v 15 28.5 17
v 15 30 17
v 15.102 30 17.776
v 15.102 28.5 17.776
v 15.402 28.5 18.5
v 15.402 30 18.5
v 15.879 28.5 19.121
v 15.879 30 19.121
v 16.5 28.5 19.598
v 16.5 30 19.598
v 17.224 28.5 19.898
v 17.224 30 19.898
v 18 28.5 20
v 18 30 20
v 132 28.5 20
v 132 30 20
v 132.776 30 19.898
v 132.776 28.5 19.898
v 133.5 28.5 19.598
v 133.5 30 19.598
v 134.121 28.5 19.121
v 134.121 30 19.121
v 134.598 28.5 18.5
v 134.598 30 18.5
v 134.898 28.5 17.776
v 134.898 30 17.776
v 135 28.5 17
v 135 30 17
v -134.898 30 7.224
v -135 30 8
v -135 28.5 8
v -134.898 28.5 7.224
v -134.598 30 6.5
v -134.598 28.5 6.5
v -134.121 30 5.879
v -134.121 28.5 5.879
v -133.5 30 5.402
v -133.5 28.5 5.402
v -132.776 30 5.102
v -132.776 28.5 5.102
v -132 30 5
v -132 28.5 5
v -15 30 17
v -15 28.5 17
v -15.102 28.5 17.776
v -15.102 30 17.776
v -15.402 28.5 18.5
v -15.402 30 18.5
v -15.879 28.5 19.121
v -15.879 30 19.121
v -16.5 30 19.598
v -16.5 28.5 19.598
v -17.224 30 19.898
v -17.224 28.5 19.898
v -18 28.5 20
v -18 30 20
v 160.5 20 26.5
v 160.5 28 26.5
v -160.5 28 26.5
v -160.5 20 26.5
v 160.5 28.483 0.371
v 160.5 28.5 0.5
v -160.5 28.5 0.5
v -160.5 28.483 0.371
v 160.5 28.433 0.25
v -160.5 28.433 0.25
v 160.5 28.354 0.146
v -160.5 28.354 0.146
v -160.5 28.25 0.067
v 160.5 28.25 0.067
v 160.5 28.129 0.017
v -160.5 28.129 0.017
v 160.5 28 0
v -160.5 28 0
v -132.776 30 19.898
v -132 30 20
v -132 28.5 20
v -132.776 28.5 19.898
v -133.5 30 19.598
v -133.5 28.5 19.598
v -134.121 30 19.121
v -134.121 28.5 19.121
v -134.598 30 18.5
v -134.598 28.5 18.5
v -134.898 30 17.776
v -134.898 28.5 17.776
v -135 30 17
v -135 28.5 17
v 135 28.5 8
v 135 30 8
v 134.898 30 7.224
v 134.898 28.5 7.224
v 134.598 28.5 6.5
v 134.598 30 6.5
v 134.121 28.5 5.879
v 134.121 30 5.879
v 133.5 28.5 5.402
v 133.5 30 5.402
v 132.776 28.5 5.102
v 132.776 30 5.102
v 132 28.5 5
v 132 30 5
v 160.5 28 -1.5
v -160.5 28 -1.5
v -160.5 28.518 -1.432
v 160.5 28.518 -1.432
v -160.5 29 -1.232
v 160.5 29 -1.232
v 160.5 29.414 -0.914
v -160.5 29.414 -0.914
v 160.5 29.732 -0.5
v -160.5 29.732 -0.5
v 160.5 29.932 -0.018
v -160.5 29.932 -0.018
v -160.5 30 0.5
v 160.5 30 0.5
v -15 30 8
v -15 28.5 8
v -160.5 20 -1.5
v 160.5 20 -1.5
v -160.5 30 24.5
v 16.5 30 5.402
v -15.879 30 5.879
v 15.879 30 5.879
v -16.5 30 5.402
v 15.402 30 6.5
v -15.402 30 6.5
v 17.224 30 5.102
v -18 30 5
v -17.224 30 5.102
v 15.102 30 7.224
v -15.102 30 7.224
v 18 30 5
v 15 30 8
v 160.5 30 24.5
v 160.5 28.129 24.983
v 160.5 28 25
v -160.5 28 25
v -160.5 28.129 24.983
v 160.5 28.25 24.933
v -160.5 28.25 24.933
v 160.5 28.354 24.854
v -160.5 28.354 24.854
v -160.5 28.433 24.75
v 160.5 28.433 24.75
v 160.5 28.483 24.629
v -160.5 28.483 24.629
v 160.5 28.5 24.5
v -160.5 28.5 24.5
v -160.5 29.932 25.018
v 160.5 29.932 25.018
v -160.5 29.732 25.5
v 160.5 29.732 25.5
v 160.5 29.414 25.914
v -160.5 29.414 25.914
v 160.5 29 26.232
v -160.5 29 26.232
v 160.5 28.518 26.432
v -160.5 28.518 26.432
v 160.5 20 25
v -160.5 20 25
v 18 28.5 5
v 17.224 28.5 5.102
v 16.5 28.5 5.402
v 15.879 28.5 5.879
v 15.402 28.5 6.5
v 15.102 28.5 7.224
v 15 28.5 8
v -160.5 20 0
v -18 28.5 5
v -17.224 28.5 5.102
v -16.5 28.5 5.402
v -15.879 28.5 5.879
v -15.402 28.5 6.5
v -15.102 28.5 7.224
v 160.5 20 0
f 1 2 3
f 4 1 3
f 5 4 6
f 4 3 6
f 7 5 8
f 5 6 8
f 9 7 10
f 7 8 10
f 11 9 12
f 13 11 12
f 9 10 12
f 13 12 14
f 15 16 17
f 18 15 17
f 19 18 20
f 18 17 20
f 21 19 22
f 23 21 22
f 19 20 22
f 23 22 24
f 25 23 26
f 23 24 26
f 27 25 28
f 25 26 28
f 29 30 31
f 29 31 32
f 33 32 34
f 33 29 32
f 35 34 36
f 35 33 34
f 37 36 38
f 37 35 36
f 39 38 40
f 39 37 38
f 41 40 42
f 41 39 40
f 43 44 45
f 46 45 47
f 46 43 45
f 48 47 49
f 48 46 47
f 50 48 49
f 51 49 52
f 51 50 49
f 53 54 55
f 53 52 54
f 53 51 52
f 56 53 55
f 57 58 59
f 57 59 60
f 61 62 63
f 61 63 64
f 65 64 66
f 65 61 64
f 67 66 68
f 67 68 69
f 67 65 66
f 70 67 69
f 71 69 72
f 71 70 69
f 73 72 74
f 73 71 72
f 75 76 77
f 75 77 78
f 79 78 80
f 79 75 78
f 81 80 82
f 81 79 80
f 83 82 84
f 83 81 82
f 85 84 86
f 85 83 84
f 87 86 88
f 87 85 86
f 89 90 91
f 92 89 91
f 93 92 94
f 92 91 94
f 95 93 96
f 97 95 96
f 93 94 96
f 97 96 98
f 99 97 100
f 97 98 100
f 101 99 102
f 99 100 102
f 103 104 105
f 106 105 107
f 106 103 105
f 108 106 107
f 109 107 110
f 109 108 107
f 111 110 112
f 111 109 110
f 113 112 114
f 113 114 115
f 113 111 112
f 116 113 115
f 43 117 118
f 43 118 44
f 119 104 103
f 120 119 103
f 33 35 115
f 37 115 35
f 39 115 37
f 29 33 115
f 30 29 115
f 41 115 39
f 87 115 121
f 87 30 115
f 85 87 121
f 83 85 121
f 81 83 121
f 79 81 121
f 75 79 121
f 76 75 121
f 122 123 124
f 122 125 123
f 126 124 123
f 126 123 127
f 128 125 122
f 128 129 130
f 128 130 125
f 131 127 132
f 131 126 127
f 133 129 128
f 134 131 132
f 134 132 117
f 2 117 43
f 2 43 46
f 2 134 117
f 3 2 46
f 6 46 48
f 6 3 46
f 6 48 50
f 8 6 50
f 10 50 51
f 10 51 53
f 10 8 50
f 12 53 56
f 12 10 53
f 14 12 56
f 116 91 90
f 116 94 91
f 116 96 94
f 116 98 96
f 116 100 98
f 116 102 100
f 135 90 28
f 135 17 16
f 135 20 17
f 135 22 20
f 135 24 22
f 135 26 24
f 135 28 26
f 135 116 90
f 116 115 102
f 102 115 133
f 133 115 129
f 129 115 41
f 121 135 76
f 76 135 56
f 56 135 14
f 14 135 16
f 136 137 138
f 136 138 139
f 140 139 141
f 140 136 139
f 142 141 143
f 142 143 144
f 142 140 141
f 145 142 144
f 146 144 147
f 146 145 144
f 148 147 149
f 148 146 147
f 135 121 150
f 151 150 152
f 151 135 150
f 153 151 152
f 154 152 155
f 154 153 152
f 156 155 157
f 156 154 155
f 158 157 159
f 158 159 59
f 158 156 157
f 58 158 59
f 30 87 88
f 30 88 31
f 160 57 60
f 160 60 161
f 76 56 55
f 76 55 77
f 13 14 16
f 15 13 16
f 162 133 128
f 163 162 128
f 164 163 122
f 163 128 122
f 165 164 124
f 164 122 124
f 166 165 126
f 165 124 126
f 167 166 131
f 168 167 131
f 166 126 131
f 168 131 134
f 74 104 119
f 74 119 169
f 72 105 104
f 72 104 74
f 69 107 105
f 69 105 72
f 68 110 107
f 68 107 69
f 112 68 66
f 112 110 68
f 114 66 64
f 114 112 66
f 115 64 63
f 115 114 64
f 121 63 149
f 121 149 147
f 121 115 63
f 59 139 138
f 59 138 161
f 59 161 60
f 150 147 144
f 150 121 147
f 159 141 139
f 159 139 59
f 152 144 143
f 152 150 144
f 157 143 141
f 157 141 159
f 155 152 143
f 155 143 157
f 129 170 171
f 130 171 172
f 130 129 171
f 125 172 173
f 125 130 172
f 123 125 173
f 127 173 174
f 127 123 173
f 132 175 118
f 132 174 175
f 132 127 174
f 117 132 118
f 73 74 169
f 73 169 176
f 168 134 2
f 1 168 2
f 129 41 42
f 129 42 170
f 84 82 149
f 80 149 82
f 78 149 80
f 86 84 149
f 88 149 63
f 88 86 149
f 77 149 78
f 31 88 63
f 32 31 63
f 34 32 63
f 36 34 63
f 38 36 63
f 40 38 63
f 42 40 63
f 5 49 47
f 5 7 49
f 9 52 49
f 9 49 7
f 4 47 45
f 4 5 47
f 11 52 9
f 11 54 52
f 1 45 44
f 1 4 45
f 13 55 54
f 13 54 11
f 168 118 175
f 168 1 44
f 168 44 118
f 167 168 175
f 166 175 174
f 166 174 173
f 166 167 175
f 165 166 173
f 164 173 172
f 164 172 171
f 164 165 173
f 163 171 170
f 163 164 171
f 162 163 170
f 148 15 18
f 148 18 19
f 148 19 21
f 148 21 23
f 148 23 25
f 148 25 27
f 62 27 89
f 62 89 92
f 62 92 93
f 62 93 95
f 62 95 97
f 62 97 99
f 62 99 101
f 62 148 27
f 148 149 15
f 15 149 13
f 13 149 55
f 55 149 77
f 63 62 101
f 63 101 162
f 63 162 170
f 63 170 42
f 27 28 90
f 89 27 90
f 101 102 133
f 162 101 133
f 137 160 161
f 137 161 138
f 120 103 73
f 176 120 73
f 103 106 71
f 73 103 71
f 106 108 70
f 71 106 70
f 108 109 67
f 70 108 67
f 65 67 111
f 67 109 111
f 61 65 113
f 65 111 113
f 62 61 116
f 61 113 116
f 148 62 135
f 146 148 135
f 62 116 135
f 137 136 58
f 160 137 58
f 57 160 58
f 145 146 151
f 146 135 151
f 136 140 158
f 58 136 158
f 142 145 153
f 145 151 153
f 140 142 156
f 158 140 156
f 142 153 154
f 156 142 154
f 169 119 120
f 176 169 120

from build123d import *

# Parameters (mm, degrees)
SKETCH_1_W                         = 321
SKETCH_1_H                         = 60
SM_BASE_FLANGE_1_DEPTH             = 1.5
SM_EDGE_FLANGE_1_STRIP_W           = 7
SM_EDGE_FLANGE_1_STRIP_H           = 1.5
SM_EDGE_FLANGE_1_STRIP_CUT_DEPTH   = 321
SM_EDGE_FLANGE_1_STRIP_2_W         = 7
SM_EDGE_FLANGE_1_STRIP_2_H         = 1.5
SM_EDGE_FLANGE_1_STRIP_CUT_2_DEPTH = 321
SM_EDGE_FLANGE_1_DEPTH             = 321
SM_EDGE_FLANGE_1_BEND_DEPTH        = 321
SM_EDGE_FLANGE_2_STRIP_W           = 7
SM_EDGE_FLANGE_2_STRIP_H           = 1.5
SM_EDGE_FLANGE_2_STRIP_CUT_DEPTH   = 321
SM_EDGE_FLANGE_2_STRIP_2_W         = 7
SM_EDGE_FLANGE_2_STRIP_2_H         = 1.5
SM_EDGE_FLANGE_2_STRIP_CUT_2_DEPTH = 321
SM_EDGE_FLANGE_2_DEPTH             = 321
SM_EDGE_FLANGE_2_BEND_DEPTH        = 321
CUT_EXTRUDE_2_DEPTH                = 174.385408844
CUT_EXTRUDE_3_DEPTH                = 57
CUT_EXTRUDE_3_DEPTH_BACK           = 10
SKETCH_20_W                        = 341.087454661
SKETCH_20_H                        = 74.910603127


# Sheet-metal steps are written as plain solids
with BuildPart() as part:
    # Sketch 1 → 基体-法兰1 (new body)
    with BuildSketch(Plane.XY):
        Rectangle(SKETCH_1_W, SKETCH_1_H)
    extrude(amount=-SM_BASE_FLANGE_1_DEPTH)

    # 边线-法兰1 strip (across the edge) → 边线-法兰1 strip cut (cut)
    with BuildSketch(Plane(origin=(160.5, 30, 0), x_dir=(0, -1, 0), z_dir=(-1, 0, 0))):
        with Locations((-1.5, -0.75)):
            Rectangle(SM_EDGE_FLANGE_1_STRIP_W, SM_EDGE_FLANGE_1_STRIP_H)
    extrude(amount=SM_EDGE_FLANGE_1_STRIP_CUT_DEPTH, mode=Mode.SUBTRACT)

    # 边线-法兰1 strip 2 (across the edge) → 边线-法兰1 strip cut 2 (cut)
    with BuildSketch(Plane(origin=(-160.5, -30, 0), x_dir=(0, 1, 0), z_dir=(1, 0, 0))):
        with Locations((-1.5, -0.75)):
            Rectangle(SM_EDGE_FLANGE_1_STRIP_2_W, SM_EDGE_FLANGE_1_STRIP_2_H)
    extrude(amount=SM_EDGE_FLANGE_1_STRIP_CUT_2_DEPTH, mode=Mode.SUBTRACT)

    # 边线-法兰1 section (across the edge) → 边线-法兰1 (add)
    with BuildSketch(Plane(origin=(160.5, 30, 0), x_dir=(0, -1, 0), z_dir=(-1, 0, 0))):
        with BuildLine():
            Line((0, 0.5), (0, 26.5))
            Line((0, 26.5), (1.5, 26.5))
            Line((1.5, 26.5), (1.5, 0.5))
            ThreePointArc((1.5, 0.5), (1.646446609, 0.146446609), (2, 0))
            Line((2, 0), (2, -1.5))
            ThreePointArc((2, -1.5), (0.585786438, -0.914213562), (0, 0.5))
        make_face()
    extrude(amount=SM_EDGE_FLANGE_1_DEPTH)

    # 边线-法兰1 section 2 (across the edge) → 边线-法兰1 bend (add)
    with BuildSketch(Plane(origin=(-160.5, -30, 0), x_dir=(0, 1, 0), z_dir=(1, 0, 0))):
        with BuildLine():
            Line((0, 0.5), (0, 26.5))
            Line((0, 26.5), (1.5, 26.5))
            Line((1.5, 26.5), (1.5, 0.5))
            ThreePointArc((1.5, 0.5), (1.646446609, 0.146446609), (2, 0))
            Line((2, 0), (2, -1.5))
            ThreePointArc((2, -1.5), (0.585786438, -0.914213562), (0, 0.5))
        make_face()
    extrude(amount=SM_EDGE_FLANGE_1_BEND_DEPTH)

    # 边线-法兰2 strip (across the edge) → 边线-法兰2 strip cut (cut)
    with BuildSketch(Plane(origin=(160.5, 28.5, 26.5), x_dir=(0, 0, -1), z_dir=(-1, 0, 0))):
        with Locations((-1.5, -0.75)):
            Rectangle(SM_EDGE_FLANGE_2_STRIP_W, SM_EDGE_FLANGE_2_STRIP_H)
    extrude(amount=SM_EDGE_FLANGE_2_STRIP_CUT_DEPTH, mode=Mode.SUBTRACT)

    # 边线-法兰2 strip 2 (across the edge) → 边线-法兰2 strip cut 2 (cut)
    with BuildSketch(Plane(origin=(-160.5, -28.5, 26.5), x_dir=(0, 0, -1), z_dir=(1, 0, 0))):
        with Locations((-1.5, -0.75)):
            Rectangle(SM_EDGE_FLANGE_2_STRIP_2_W, SM_EDGE_FLANGE_2_STRIP_2_H)
    extrude(amount=SM_EDGE_FLANGE_2_STRIP_CUT_2_DEPTH, mode=Mode.SUBTRACT)

    # 边线-法兰2 section (across the edge) → 边线-法兰2 (add)
    with BuildSketch(Plane(origin=(160.5, 28.5, 26.5), x_dir=(0, 0, -1), z_dir=(-1, 0, 0))):
        with BuildLine():
            Line((0, 0.5), (0, 8.5))
            Line((0, 8.5), (1.5, 8.5))
            Line((1.5, 8.5), (1.5, 0.5))
            ThreePointArc((1.5, 0.5), (1.646446609, 0.146446609), (2, 0))
            Line((2, 0), (2, -1.5))
            ThreePointArc((2, -1.5), (0.585786438, -0.914213562), (0, 0.5))
        make_face()
    extrude(amount=SM_EDGE_FLANGE_2_DEPTH)

    # 边线-法兰2 section 2 (across the edge) → 边线-法兰2 bend (add)
    with BuildSketch(Plane(origin=(-160.5, -28.5, 26.5), x_dir=(0, 0, -1), z_dir=(1, 0, 0))):
        with BuildLine():
            Line((0, 0.5), (0, 8.5))
            Line((0, 8.5), (1.5, 8.5))
            Line((1.5, 8.5), (1.5, 0.5))
            ThreePointArc((1.5, 0.5), (1.646446609, 0.146446609), (2, 0))
            Line((2, 0), (2, -1.5))
            ThreePointArc((2, -1.5), (0.585786438, -0.914213562), (0, 0.5))
        make_face()
    extrude(amount=SM_EDGE_FLANGE_2_BEND_DEPTH)

    # 草图19 → 切除-拉伸2 (cut, through all)
    with BuildSketch(Plane(origin=(0, 30, 0), x_dir=(1, 0, 0), z_dir=(0, 1, 0))):
        with BuildLine():
            Line((-132, -5), (-18, -5))
            ThreePointArc((-18, -5), (-15.878679656, -5.878679656), (-15, -8))
            Line((-15, -8), (-15, -17))
            ThreePointArc((-15, -17), (-15.878679656, -19.121320344), (-18, -20))
            Line((-18, -20), (-132, -20))
            ThreePointArc((-132, -20), (-134.121320344, -19.121320344), (-135, -17))
            Line((-135, -17), (-135, -8))
            ThreePointArc((-135, -8), (-134.121320344, -5.878679656), (-132, -5))
        make_face()
    cut_extrude_2 = extrude(amount=-CUT_EXTRUDE_2_DEPTH, mode=Mode.SUBTRACT)

    # 镜向1: 切除-拉伸2 across plane
    add(cut_extrude_2.mirror(Plane(origin=(0, 0, 0), x_dir=(0, 0, 1), z_dir=(1, 0, 0))), mode=Mode.SUBTRACT)

    # 草图20 → 切除-拉伸3 (cut, two sides: drawn at the far end of the back side and taken through both)
    with BuildSketch(Plane.XY.offset(-CUT_EXTRUDE_3_DEPTH_BACK)):
        with Locations((-10.043727331, -17.455301564)):
            Rectangle(SKETCH_20_W, SKETCH_20_H)
    extrude(amount=CUT_EXTRUDE_3_DEPTH + CUT_EXTRUDE_3_DEPTH_BACK, mode=Mode.SUBTRACT)


solid = part.part
